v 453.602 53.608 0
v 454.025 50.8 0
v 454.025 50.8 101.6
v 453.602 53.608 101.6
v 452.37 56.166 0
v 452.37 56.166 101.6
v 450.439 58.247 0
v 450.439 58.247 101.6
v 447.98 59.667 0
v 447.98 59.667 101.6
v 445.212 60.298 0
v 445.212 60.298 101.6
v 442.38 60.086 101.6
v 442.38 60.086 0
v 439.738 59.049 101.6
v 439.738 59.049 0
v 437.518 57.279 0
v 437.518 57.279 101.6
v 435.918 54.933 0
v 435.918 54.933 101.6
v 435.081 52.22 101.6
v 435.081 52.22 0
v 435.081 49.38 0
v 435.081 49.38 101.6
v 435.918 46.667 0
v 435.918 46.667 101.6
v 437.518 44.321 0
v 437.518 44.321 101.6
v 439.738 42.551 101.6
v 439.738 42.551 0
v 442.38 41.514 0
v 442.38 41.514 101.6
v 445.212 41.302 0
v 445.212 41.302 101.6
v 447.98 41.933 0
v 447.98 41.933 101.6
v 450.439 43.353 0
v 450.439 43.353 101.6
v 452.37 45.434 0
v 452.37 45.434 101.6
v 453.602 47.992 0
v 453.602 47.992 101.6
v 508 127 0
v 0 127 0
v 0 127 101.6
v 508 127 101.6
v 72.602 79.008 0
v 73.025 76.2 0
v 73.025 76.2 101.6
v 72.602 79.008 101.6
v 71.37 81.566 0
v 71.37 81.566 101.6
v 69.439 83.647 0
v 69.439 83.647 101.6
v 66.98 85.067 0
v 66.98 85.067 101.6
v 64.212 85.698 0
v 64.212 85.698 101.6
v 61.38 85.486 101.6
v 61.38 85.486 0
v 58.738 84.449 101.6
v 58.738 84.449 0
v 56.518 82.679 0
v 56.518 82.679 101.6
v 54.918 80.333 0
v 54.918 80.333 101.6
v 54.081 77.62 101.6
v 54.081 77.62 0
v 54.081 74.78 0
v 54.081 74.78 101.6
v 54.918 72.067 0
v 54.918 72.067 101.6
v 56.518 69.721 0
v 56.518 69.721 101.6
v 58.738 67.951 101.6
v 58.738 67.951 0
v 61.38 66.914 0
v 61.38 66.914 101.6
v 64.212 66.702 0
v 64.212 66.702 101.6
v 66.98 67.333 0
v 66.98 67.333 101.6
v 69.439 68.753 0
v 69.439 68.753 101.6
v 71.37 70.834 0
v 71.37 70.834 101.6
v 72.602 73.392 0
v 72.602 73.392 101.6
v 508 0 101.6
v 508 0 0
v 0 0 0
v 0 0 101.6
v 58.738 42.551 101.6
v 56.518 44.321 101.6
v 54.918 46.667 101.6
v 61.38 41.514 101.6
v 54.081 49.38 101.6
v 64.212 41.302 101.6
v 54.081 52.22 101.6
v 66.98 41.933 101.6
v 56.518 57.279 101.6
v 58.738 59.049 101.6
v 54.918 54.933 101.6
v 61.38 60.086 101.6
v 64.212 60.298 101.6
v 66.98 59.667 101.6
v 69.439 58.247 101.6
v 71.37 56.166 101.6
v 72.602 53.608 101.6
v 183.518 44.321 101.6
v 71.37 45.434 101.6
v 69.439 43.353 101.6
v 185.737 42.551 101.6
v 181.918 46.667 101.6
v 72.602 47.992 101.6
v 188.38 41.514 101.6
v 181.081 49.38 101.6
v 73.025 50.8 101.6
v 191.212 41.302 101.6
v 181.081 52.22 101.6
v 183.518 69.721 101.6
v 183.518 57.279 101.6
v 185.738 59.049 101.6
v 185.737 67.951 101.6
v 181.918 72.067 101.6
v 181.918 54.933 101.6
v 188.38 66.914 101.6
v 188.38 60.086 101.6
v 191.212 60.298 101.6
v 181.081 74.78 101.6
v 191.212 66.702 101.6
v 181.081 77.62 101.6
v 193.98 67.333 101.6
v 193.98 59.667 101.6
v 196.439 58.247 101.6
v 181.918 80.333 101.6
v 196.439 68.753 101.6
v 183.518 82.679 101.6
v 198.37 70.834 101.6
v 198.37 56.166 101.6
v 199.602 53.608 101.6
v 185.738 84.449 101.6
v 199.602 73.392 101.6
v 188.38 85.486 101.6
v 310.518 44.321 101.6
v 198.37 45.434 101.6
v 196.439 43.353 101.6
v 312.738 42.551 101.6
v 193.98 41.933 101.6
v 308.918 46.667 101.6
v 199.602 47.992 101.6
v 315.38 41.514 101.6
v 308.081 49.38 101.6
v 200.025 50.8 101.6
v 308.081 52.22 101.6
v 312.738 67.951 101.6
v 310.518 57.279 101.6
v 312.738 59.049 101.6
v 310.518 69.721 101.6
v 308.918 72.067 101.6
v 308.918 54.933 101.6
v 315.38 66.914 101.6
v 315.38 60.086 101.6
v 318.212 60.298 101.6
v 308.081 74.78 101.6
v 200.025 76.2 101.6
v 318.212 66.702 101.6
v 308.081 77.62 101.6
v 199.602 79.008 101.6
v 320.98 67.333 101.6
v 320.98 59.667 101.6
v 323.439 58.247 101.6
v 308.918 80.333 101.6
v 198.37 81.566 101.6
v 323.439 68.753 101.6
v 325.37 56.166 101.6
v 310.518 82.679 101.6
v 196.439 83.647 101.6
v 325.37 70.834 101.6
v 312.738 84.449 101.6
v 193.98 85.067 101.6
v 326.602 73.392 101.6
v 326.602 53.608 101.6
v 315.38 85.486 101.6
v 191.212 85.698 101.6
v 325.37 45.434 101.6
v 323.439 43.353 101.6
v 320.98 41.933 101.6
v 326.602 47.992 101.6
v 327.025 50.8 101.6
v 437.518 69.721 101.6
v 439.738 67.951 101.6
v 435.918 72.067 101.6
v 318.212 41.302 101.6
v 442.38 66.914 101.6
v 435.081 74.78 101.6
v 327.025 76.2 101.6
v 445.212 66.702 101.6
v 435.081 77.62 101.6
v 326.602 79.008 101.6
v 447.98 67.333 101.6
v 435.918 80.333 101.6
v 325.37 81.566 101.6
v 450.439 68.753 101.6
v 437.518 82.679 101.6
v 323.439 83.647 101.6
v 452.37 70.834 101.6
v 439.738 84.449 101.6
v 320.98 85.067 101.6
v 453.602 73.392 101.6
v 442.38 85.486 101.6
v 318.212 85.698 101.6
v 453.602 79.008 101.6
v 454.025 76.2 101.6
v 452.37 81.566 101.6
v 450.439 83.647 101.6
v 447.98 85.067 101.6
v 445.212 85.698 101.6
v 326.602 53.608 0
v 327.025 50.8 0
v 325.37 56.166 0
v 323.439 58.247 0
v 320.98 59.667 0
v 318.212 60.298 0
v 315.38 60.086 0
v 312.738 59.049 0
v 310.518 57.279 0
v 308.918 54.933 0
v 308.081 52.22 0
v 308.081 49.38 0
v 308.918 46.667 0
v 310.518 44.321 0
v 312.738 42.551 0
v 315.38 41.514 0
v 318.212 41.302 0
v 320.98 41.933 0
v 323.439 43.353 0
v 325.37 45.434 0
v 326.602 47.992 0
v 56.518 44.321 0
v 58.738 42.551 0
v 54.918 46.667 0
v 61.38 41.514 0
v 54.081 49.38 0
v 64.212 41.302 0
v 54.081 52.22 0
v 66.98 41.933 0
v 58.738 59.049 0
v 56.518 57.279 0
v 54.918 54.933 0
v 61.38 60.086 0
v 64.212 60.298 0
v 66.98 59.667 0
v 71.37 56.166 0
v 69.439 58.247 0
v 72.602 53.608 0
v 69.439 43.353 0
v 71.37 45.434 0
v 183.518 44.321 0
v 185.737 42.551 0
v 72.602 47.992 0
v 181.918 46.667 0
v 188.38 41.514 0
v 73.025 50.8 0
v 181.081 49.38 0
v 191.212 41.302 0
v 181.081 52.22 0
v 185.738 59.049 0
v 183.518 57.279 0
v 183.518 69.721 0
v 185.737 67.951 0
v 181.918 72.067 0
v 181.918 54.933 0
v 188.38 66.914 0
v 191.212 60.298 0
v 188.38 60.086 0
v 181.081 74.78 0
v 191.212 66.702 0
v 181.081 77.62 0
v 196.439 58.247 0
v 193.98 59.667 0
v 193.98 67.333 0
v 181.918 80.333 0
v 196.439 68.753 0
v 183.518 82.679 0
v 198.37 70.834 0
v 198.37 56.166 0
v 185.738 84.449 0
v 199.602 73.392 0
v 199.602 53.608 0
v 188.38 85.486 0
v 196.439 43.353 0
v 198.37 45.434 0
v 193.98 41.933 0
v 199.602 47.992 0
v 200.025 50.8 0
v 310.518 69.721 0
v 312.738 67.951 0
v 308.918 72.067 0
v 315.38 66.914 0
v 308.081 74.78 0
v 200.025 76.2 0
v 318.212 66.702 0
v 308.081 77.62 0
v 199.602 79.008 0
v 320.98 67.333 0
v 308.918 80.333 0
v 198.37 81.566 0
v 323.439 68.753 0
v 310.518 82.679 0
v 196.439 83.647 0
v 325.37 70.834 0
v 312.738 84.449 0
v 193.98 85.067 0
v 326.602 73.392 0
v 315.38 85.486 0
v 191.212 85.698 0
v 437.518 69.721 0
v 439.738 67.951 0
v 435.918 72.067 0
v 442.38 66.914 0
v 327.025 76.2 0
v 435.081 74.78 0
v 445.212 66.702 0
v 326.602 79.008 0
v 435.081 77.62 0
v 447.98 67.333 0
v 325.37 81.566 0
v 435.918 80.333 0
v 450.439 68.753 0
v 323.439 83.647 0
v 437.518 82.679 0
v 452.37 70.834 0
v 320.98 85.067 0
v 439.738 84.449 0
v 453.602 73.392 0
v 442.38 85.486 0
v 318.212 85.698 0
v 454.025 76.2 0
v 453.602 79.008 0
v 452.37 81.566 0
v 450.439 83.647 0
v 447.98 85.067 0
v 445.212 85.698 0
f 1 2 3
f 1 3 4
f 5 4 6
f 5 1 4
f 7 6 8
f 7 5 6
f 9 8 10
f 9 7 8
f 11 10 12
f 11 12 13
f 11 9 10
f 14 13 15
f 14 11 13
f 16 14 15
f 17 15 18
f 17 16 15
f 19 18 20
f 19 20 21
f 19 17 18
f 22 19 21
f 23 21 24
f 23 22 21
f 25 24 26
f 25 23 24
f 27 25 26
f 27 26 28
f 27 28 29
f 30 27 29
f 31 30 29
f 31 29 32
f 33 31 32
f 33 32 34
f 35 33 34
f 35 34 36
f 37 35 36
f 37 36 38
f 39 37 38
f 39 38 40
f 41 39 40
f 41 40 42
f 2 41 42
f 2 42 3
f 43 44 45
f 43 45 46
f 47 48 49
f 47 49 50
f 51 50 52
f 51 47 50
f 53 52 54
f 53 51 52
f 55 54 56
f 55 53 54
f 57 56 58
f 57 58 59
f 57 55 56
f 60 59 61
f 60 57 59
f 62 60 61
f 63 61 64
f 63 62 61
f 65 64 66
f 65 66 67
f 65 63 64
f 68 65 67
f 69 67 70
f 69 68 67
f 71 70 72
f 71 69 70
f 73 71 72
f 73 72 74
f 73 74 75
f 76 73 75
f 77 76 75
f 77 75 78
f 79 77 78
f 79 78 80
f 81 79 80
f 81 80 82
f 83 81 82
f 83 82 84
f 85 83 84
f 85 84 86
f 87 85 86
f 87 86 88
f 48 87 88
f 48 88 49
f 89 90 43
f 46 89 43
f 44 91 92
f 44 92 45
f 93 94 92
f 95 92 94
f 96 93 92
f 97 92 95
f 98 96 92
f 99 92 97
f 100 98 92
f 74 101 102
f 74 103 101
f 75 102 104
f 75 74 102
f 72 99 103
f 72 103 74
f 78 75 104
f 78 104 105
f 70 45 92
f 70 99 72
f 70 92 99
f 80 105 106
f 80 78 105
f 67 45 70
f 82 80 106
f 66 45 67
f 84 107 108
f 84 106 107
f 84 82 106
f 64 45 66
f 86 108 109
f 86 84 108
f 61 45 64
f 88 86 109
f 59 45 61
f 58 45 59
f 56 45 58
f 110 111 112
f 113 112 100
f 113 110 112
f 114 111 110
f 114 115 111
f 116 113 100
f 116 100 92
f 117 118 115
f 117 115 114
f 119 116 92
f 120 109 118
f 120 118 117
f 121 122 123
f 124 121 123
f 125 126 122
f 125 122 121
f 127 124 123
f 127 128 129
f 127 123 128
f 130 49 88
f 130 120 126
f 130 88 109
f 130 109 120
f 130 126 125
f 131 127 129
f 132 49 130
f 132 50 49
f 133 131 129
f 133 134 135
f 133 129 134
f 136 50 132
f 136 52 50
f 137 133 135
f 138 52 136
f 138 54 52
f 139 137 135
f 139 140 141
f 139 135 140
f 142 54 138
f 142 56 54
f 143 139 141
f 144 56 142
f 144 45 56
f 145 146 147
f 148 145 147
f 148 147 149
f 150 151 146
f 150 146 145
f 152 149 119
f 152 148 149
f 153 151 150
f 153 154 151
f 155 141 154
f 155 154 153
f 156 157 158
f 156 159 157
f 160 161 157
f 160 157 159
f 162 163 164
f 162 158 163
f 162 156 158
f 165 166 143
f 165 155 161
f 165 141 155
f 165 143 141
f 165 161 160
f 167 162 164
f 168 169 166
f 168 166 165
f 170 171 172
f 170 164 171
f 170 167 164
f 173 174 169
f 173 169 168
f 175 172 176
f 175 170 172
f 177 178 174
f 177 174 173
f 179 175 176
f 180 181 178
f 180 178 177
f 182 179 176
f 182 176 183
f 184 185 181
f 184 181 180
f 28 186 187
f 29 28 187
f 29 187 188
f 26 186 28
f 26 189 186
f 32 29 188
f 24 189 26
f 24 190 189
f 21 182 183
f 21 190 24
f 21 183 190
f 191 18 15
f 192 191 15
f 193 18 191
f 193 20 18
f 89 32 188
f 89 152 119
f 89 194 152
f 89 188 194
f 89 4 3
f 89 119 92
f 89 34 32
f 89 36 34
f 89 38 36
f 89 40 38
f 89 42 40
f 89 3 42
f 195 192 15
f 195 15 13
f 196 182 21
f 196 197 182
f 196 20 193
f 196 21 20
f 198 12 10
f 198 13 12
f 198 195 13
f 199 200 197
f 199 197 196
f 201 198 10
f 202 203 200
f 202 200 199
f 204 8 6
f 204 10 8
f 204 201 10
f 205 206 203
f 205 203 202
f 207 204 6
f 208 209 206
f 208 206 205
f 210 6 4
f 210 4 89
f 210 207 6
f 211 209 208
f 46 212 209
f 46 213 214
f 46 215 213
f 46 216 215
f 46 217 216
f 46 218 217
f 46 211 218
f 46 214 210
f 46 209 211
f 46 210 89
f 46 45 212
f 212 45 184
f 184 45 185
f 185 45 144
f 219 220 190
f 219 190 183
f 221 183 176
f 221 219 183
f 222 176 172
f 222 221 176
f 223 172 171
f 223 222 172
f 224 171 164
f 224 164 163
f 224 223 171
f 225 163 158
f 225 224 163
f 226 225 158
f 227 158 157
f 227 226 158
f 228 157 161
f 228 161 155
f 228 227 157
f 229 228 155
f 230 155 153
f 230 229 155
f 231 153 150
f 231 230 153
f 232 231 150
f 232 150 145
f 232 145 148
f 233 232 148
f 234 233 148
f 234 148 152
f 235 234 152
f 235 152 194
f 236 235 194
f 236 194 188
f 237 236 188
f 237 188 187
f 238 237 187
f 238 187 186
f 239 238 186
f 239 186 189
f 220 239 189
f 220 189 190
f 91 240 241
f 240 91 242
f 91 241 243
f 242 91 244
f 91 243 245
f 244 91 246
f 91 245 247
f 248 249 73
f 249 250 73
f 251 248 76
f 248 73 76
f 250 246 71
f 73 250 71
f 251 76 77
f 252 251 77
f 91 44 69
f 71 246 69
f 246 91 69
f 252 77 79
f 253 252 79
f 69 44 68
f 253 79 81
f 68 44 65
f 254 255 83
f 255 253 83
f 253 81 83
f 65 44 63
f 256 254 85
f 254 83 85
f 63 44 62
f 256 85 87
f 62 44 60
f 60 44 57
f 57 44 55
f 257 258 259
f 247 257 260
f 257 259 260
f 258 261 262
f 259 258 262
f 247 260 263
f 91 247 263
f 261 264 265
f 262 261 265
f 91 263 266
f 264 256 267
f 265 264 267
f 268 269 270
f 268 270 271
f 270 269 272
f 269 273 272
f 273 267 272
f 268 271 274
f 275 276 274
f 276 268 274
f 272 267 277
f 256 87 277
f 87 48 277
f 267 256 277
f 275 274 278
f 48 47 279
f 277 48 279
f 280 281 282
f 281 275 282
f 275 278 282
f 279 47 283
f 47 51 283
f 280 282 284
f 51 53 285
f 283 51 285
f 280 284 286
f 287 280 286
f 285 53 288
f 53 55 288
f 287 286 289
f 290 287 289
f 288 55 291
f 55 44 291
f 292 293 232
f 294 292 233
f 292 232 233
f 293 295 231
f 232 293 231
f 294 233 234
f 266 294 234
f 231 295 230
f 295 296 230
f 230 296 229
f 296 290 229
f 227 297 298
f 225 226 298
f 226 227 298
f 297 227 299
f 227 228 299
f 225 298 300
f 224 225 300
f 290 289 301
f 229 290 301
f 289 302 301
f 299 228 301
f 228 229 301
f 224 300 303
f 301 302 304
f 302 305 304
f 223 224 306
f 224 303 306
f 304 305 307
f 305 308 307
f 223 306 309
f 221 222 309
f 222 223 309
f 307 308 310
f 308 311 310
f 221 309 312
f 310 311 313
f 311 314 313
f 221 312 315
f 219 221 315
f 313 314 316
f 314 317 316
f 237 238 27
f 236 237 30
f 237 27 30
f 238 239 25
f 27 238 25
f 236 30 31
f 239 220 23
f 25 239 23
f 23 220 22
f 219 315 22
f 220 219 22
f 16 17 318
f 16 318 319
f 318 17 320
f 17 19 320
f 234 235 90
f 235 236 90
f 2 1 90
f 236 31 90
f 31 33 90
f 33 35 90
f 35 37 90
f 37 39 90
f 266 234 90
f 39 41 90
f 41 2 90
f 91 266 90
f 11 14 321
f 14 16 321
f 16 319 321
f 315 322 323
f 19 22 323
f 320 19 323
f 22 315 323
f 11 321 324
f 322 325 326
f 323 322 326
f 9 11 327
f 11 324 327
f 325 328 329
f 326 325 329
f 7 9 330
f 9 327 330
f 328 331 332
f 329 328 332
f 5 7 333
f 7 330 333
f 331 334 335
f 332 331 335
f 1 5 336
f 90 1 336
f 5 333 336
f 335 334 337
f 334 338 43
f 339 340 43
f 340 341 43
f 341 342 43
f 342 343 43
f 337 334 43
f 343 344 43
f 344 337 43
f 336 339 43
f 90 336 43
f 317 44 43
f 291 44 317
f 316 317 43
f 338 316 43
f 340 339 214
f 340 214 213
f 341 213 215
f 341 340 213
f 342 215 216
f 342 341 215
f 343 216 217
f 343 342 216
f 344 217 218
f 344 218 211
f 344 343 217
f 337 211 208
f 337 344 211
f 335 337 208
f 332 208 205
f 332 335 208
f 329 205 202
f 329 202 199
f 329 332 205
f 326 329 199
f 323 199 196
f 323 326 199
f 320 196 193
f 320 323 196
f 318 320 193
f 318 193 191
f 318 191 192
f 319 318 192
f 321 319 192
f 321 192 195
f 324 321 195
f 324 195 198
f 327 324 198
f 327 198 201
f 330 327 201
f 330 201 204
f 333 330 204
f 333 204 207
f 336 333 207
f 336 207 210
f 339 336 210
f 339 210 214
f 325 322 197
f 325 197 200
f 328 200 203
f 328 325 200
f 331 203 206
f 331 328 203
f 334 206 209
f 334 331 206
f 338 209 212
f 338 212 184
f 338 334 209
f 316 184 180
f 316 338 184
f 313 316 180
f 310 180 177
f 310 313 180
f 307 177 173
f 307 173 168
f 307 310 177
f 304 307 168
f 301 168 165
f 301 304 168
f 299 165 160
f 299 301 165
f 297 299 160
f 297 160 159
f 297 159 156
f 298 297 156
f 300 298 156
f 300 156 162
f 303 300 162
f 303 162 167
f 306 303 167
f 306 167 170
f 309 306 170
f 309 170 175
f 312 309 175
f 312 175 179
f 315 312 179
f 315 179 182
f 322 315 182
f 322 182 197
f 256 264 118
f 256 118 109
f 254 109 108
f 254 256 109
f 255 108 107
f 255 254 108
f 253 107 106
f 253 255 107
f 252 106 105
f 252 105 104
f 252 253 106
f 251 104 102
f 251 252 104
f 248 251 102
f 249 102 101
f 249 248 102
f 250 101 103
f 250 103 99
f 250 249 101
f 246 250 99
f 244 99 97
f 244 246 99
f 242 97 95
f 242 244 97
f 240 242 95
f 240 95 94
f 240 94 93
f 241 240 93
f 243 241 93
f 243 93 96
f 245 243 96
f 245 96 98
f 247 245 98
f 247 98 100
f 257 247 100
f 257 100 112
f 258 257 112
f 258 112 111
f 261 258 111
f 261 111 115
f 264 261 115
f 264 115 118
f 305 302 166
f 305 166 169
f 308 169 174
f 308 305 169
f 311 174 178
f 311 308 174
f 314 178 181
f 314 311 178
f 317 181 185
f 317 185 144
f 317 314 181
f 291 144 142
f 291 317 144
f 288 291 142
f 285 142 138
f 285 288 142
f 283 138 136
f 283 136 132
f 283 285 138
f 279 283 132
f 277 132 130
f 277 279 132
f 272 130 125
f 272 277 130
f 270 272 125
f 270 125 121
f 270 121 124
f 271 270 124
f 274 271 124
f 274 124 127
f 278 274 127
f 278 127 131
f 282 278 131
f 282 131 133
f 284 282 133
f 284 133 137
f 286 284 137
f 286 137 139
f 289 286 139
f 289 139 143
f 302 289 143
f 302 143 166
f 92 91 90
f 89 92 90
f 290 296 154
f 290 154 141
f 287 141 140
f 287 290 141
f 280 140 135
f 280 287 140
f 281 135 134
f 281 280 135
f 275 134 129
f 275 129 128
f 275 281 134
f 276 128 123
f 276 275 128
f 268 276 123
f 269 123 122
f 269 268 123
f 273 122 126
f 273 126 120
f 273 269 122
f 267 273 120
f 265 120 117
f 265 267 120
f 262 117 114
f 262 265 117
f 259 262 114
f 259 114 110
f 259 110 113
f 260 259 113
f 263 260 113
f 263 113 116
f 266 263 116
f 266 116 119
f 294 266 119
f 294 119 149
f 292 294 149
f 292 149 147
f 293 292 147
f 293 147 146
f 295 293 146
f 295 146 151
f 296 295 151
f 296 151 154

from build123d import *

# Parameters (mm, degrees)
F0_W     = 508
F0_H     = 127
F0_R     = 9.525
F1_DEPTH = 25.4
F3_DEPTH = 101.6


# Not quite as in the source:
# - a fillet or chamfer that OpenCascade refuses, or shapes differently, is made with other operations: its cross-section is extruded or revolved along the edge and cut away or added


with BuildPart() as f1:
    # F0 (on Top) → F1 (new body)
    with BuildSketch(Plane.XY):
        with Locations((254, 63.5)):
            Rectangle(F0_W, F0_H)
        with Locations((63.5, 50.8)):
            Circle(F0_R, mode=Mode.SUBTRACT)
        with Locations((190.5, 50.8)):
            Circle(F0_R, mode=Mode.SUBTRACT)
        with Locations((317.5, 50.8)):
            Circle(F0_R, mode=Mode.SUBTRACT)
        with Locations((444.5, 50.8)):
            Circle(F0_R, mode=Mode.SUBTRACT)
        with Locations((63.5, 76.2)):
            Circle(F0_R, mode=Mode.SUBTRACT)
        with Locations((190.5, 76.2)):
            Circle(F0_R, mode=Mode.SUBTRACT)
        with Locations((317.5, 76.2)):
            Circle(F0_R, mode=Mode.SUBTRACT)
        with Locations((444.5, 76.2)):
            Circle(F0_R, mode=Mode.SUBTRACT)
    extrude(amount=F1_DEPTH)

    # F2: fillet of radius 5.08 on 16 edges, made by hand

    # F2_s1 → F2_t2 (revolve, cut)
    with BuildSketch(Plane.XZ.offset(-76.2)):
        with BuildLine():
            ThreePointArc((200.025, 20.32), (201.5128975516, 23.9121024484), (205.105, 25.4))
            Line((205.105, 25.4), (200.025, 25.4))
            Line((200.025, 25.4), (200.025, 20.32))
        make_face()
    revolve(axis=Axis((190.5, 76.2, 25.4), (0, 0, 1)), mode=Mode.SUBTRACT)

    # F2_s3 → F2_t4 (revolve, cut)
    with BuildSketch(Plane.XZ.offset(-50.8)):
        with BuildLine():
            ThreePointArc((200.025, 20.32), (201.5128975516, 23.9121024484), (205.105, 25.4))
            Line((205.105, 25.4), (200.025, 25.4))
            Line((200.025, 25.4), (200.025, 20.32))
        make_face()
    revolve(axis=Axis((190.5, 50.8, 25.4), (0, 0, 1)), mode=Mode.SUBTRACT)

    # F2_s5 → F2_t6 (revolve, cut)
    with BuildSketch(Plane.XZ.offset(-76.2)):
        with BuildLine():
            ThreePointArc((327.025, 20.32), (328.5128975516, 23.9121024484), (332.105, 25.4))
            Line((332.105, 25.4), (327.025, 25.4))
            Line((327.025, 25.4), (327.025, 20.32))
        make_face()
    revolve(axis=Axis((317.5, 76.2, 25.4), (0, 0, 1)), mode=Mode.SUBTRACT)

    # F2_s7 → F2_t8 (revolve, cut)
    with BuildSketch(Plane.XZ.offset(-50.8)):
        with BuildLine():
            ThreePointArc((327.025, 20.32), (328.5128975516, 23.9121024484), (332.105, 25.4))
            Line((332.105, 25.4), (327.025, 25.4))
            Line((327.025, 25.4), (327.025, 20.32))
        make_face()
    revolve(axis=Axis((317.5, 50.8, 25.4), (0, 0, 1)), mode=Mode.SUBTRACT)

    # F2_s9 → F2_t10 (revolve, cut)
    with BuildSketch(Plane.XZ.offset(-76.2)):
        with BuildLine():
            ThreePointArc((73.025, 20.32), (74.5128975516, 23.9121024484), (78.105, 25.4))
            Line((78.105, 25.4), (73.025, 25.4))
            Line((73.025, 25.4), (73.025, 20.32))
        make_face()
    revolve(axis=Axis((63.5, 76.2, 25.4), (0, 0, 1)), mode=Mode.SUBTRACT)

    # F2_s11 → F2_t12 (revolve, cut)
    with BuildSketch(Plane.XZ.offset(-50.8)):
        with BuildLine():
            ThreePointArc((73.025, 20.32), (74.5128975516, 23.9121024484), (78.105, 25.4))
            Line((78.105, 25.4), (73.025, 25.4))
            Line((73.025, 25.4), (73.025, 20.32))
        make_face()
    revolve(axis=Axis((63.5, 50.8, 25.4), (0, 0, 1)), mode=Mode.SUBTRACT)

    # F2_s13 → F2_t14 (revolve, cut)
    with BuildSketch(Plane.XZ.offset(-76.2)):
        with BuildLine():
            ThreePointArc((454.025, 20.32), (455.5128975516, 23.9121024484), (459.105, 25.4))
            Line((459.105, 25.4), (454.025, 25.4))
            Line((454.025, 25.4), (454.025, 20.32))
        make_face()
    revolve(axis=Axis((444.5, 76.2, 25.4), (0, 0, 1)), mode=Mode.SUBTRACT)

    # F2_s15 → F2_t16 (revolve, cut)
    with BuildSketch(Plane.XZ.offset(-50.8)):
        with BuildLine():
            ThreePointArc((454.025, 20.32), (455.5128975516, 23.9121024484), (459.105, 25.4))
            Line((459.105, 25.4), (454.025, 25.4))
            Line((454.025, 25.4), (454.025, 20.32))
        make_face()
    revolve(axis=Axis((444.5, 50.8, 25.4), (0, 0, 1)), mode=Mode.SUBTRACT)

    # F2_s17 → F2_t18 (revolve, cut)
    with BuildSketch(Plane.XZ.offset(-50.8)):
        with BuildLine():
            ThreePointArc((200.025, 5.08), (201.5128975516, 1.4878975516), (205.105, 0))
            Line((205.105, 0), (200.025, 0))
            Line((200.025, 0), (200.025, 5.08))
        make_face()
    revolve(axis=Axis((190.5, 50.8, 0), (0, 0, 1)), mode=Mode.SUBTRACT)

    # F2_s19 → F2_t20 (revolve, cut)
    with BuildSketch(Plane.XZ.offset(-76.2)):
        with BuildLine():
            ThreePointArc((200.025, 5.08), (201.5128975516, 1.4878975516), (205.105, 0))
            Line((205.105, 0), (200.025, 0))
            Line((200.025, 0), (200.025, 5.08))
        make_face()
    revolve(axis=Axis((190.5, 76.2, 0), (0, 0, 1)), mode=Mode.SUBTRACT)

    # F2_s21 → F2_t22 (revolve, cut)
    with BuildSketch(Plane.XZ.offset(-50.8)):
        with BuildLine():
            ThreePointArc((327.025, 5.08), (328.5128975516, 1.4878975516), (332.105, 0))
            Line((332.105, 0), (327.025, 0))
            Line((327.025, 0), (327.025, 5.08))
        make_face()
    revolve(axis=Axis((317.5, 50.8, 0), (0, 0, 1)), mode=Mode.SUBTRACT)

    # F2_s23 → F2_t24 (revolve, cut)
    with BuildSketch(Plane.XZ.offset(-76.2)):
        with BuildLine():
            ThreePointArc((327.025, 5.08), (328.5128975516, 1.4878975516), (332.105, 0))
            Line((332.105, 0), (327.025, 0))
            Line((327.025, 0), (327.025, 5.08))
        make_face()
    revolve(axis=Axis((317.5, 76.2, 0), (0, 0, 1)), mode=Mode.SUBTRACT)

    # F2_s25 → F2_t26 (revolve, cut)
    with BuildSketch(Plane.XZ.offset(-50.8)):
        with BuildLine():
            ThreePointArc((454.025, 5.08), (455.5128975516, 1.4878975516), (459.105, 0))
            Line((459.105, 0), (454.025, 0))
            Line((454.025, 0), (454.025, 5.08))
        make_face()
    revolve(axis=Axis((444.5, 50.8, 0), (0, 0, 1)), mode=Mode.SUBTRACT)

    # F2_s27 → F2_t28 (revolve, cut)
    with BuildSketch(Plane.XZ.offset(-76.2)):
        with BuildLine():
            ThreePointArc((454.025, 5.08), (455.5128975516, 1.4878975516), (459.105, 0))
            Line((459.105, 0), (454.025, 0))
            Line((454.025, 0), (454.025, 5.08))
        make_face()
    revolve(axis=Axis((444.5, 76.2, 0), (0, 0, 1)), mode=Mode.SUBTRACT)

    # F2_s29 → F2_t30 (revolve, cut)
    with BuildSketch(Plane.XZ.offset(-76.2)):
        with BuildLine():
            ThreePointArc((73.025, 5.08), (74.5128975516, 1.4878975516), (78.105, 0))
            Line((78.105, 0), (73.025, 0))
            Line((73.025, 0), (73.025, 5.08))
        make_face()
    revolve(axis=Axis((63.5, 76.2, 0), (0, 0, 1)), mode=Mode.SUBTRACT)

    # F2_s31 → F2_t32 (revolve, cut)
    with BuildSketch(Plane.XZ.offset(-50.8)):
        with BuildLine():
            ThreePointArc((73.025, 5.08), (74.5128975516, 1.4878975516), (78.105, 0))
            Line((78.105, 0), (73.025, 0))
            Line((73.025, 0), (73.025, 5.08))
        make_face()
    revolve(axis=Axis((63.5, 50.8, 0), (0, 0, 1)), mode=Mode.SUBTRACT)

    # F0 (on Top) → F3 (join)
    with BuildSketch(Plane.XY):
        with Locations((254, 63.5)):
            Rectangle(F0_W, F0_H)
        with Locations((63.5, 50.8)):
            Circle(F0_R, mode=Mode.SUBTRACT)
        with Locations((190.5, 50.8)):
            Circle(F0_R, mode=Mode.SUBTRACT)
        with Locations((317.5, 50.8)):
            Circle(F0_R, mode=Mode.SUBTRACT)
        with Locations((444.5, 50.8)):
            Circle(F0_R, mode=Mode.SUBTRACT)
        with Locations((63.5, 76.2)):
            Circle(F0_R, mode=Mode.SUBTRACT)
        with Locations((190.5, 76.2)):
            Circle(F0_R, mode=Mode.SUBTRACT)
        with Locations((317.5, 76.2)):
            Circle(F0_R, mode=Mode.SUBTRACT)
        with Locations((444.5, 76.2)):
            Circle(F0_R, mode=Mode.SUBTRACT)
    extrude(amount=F3_DEPTH)


solid = f1.part
